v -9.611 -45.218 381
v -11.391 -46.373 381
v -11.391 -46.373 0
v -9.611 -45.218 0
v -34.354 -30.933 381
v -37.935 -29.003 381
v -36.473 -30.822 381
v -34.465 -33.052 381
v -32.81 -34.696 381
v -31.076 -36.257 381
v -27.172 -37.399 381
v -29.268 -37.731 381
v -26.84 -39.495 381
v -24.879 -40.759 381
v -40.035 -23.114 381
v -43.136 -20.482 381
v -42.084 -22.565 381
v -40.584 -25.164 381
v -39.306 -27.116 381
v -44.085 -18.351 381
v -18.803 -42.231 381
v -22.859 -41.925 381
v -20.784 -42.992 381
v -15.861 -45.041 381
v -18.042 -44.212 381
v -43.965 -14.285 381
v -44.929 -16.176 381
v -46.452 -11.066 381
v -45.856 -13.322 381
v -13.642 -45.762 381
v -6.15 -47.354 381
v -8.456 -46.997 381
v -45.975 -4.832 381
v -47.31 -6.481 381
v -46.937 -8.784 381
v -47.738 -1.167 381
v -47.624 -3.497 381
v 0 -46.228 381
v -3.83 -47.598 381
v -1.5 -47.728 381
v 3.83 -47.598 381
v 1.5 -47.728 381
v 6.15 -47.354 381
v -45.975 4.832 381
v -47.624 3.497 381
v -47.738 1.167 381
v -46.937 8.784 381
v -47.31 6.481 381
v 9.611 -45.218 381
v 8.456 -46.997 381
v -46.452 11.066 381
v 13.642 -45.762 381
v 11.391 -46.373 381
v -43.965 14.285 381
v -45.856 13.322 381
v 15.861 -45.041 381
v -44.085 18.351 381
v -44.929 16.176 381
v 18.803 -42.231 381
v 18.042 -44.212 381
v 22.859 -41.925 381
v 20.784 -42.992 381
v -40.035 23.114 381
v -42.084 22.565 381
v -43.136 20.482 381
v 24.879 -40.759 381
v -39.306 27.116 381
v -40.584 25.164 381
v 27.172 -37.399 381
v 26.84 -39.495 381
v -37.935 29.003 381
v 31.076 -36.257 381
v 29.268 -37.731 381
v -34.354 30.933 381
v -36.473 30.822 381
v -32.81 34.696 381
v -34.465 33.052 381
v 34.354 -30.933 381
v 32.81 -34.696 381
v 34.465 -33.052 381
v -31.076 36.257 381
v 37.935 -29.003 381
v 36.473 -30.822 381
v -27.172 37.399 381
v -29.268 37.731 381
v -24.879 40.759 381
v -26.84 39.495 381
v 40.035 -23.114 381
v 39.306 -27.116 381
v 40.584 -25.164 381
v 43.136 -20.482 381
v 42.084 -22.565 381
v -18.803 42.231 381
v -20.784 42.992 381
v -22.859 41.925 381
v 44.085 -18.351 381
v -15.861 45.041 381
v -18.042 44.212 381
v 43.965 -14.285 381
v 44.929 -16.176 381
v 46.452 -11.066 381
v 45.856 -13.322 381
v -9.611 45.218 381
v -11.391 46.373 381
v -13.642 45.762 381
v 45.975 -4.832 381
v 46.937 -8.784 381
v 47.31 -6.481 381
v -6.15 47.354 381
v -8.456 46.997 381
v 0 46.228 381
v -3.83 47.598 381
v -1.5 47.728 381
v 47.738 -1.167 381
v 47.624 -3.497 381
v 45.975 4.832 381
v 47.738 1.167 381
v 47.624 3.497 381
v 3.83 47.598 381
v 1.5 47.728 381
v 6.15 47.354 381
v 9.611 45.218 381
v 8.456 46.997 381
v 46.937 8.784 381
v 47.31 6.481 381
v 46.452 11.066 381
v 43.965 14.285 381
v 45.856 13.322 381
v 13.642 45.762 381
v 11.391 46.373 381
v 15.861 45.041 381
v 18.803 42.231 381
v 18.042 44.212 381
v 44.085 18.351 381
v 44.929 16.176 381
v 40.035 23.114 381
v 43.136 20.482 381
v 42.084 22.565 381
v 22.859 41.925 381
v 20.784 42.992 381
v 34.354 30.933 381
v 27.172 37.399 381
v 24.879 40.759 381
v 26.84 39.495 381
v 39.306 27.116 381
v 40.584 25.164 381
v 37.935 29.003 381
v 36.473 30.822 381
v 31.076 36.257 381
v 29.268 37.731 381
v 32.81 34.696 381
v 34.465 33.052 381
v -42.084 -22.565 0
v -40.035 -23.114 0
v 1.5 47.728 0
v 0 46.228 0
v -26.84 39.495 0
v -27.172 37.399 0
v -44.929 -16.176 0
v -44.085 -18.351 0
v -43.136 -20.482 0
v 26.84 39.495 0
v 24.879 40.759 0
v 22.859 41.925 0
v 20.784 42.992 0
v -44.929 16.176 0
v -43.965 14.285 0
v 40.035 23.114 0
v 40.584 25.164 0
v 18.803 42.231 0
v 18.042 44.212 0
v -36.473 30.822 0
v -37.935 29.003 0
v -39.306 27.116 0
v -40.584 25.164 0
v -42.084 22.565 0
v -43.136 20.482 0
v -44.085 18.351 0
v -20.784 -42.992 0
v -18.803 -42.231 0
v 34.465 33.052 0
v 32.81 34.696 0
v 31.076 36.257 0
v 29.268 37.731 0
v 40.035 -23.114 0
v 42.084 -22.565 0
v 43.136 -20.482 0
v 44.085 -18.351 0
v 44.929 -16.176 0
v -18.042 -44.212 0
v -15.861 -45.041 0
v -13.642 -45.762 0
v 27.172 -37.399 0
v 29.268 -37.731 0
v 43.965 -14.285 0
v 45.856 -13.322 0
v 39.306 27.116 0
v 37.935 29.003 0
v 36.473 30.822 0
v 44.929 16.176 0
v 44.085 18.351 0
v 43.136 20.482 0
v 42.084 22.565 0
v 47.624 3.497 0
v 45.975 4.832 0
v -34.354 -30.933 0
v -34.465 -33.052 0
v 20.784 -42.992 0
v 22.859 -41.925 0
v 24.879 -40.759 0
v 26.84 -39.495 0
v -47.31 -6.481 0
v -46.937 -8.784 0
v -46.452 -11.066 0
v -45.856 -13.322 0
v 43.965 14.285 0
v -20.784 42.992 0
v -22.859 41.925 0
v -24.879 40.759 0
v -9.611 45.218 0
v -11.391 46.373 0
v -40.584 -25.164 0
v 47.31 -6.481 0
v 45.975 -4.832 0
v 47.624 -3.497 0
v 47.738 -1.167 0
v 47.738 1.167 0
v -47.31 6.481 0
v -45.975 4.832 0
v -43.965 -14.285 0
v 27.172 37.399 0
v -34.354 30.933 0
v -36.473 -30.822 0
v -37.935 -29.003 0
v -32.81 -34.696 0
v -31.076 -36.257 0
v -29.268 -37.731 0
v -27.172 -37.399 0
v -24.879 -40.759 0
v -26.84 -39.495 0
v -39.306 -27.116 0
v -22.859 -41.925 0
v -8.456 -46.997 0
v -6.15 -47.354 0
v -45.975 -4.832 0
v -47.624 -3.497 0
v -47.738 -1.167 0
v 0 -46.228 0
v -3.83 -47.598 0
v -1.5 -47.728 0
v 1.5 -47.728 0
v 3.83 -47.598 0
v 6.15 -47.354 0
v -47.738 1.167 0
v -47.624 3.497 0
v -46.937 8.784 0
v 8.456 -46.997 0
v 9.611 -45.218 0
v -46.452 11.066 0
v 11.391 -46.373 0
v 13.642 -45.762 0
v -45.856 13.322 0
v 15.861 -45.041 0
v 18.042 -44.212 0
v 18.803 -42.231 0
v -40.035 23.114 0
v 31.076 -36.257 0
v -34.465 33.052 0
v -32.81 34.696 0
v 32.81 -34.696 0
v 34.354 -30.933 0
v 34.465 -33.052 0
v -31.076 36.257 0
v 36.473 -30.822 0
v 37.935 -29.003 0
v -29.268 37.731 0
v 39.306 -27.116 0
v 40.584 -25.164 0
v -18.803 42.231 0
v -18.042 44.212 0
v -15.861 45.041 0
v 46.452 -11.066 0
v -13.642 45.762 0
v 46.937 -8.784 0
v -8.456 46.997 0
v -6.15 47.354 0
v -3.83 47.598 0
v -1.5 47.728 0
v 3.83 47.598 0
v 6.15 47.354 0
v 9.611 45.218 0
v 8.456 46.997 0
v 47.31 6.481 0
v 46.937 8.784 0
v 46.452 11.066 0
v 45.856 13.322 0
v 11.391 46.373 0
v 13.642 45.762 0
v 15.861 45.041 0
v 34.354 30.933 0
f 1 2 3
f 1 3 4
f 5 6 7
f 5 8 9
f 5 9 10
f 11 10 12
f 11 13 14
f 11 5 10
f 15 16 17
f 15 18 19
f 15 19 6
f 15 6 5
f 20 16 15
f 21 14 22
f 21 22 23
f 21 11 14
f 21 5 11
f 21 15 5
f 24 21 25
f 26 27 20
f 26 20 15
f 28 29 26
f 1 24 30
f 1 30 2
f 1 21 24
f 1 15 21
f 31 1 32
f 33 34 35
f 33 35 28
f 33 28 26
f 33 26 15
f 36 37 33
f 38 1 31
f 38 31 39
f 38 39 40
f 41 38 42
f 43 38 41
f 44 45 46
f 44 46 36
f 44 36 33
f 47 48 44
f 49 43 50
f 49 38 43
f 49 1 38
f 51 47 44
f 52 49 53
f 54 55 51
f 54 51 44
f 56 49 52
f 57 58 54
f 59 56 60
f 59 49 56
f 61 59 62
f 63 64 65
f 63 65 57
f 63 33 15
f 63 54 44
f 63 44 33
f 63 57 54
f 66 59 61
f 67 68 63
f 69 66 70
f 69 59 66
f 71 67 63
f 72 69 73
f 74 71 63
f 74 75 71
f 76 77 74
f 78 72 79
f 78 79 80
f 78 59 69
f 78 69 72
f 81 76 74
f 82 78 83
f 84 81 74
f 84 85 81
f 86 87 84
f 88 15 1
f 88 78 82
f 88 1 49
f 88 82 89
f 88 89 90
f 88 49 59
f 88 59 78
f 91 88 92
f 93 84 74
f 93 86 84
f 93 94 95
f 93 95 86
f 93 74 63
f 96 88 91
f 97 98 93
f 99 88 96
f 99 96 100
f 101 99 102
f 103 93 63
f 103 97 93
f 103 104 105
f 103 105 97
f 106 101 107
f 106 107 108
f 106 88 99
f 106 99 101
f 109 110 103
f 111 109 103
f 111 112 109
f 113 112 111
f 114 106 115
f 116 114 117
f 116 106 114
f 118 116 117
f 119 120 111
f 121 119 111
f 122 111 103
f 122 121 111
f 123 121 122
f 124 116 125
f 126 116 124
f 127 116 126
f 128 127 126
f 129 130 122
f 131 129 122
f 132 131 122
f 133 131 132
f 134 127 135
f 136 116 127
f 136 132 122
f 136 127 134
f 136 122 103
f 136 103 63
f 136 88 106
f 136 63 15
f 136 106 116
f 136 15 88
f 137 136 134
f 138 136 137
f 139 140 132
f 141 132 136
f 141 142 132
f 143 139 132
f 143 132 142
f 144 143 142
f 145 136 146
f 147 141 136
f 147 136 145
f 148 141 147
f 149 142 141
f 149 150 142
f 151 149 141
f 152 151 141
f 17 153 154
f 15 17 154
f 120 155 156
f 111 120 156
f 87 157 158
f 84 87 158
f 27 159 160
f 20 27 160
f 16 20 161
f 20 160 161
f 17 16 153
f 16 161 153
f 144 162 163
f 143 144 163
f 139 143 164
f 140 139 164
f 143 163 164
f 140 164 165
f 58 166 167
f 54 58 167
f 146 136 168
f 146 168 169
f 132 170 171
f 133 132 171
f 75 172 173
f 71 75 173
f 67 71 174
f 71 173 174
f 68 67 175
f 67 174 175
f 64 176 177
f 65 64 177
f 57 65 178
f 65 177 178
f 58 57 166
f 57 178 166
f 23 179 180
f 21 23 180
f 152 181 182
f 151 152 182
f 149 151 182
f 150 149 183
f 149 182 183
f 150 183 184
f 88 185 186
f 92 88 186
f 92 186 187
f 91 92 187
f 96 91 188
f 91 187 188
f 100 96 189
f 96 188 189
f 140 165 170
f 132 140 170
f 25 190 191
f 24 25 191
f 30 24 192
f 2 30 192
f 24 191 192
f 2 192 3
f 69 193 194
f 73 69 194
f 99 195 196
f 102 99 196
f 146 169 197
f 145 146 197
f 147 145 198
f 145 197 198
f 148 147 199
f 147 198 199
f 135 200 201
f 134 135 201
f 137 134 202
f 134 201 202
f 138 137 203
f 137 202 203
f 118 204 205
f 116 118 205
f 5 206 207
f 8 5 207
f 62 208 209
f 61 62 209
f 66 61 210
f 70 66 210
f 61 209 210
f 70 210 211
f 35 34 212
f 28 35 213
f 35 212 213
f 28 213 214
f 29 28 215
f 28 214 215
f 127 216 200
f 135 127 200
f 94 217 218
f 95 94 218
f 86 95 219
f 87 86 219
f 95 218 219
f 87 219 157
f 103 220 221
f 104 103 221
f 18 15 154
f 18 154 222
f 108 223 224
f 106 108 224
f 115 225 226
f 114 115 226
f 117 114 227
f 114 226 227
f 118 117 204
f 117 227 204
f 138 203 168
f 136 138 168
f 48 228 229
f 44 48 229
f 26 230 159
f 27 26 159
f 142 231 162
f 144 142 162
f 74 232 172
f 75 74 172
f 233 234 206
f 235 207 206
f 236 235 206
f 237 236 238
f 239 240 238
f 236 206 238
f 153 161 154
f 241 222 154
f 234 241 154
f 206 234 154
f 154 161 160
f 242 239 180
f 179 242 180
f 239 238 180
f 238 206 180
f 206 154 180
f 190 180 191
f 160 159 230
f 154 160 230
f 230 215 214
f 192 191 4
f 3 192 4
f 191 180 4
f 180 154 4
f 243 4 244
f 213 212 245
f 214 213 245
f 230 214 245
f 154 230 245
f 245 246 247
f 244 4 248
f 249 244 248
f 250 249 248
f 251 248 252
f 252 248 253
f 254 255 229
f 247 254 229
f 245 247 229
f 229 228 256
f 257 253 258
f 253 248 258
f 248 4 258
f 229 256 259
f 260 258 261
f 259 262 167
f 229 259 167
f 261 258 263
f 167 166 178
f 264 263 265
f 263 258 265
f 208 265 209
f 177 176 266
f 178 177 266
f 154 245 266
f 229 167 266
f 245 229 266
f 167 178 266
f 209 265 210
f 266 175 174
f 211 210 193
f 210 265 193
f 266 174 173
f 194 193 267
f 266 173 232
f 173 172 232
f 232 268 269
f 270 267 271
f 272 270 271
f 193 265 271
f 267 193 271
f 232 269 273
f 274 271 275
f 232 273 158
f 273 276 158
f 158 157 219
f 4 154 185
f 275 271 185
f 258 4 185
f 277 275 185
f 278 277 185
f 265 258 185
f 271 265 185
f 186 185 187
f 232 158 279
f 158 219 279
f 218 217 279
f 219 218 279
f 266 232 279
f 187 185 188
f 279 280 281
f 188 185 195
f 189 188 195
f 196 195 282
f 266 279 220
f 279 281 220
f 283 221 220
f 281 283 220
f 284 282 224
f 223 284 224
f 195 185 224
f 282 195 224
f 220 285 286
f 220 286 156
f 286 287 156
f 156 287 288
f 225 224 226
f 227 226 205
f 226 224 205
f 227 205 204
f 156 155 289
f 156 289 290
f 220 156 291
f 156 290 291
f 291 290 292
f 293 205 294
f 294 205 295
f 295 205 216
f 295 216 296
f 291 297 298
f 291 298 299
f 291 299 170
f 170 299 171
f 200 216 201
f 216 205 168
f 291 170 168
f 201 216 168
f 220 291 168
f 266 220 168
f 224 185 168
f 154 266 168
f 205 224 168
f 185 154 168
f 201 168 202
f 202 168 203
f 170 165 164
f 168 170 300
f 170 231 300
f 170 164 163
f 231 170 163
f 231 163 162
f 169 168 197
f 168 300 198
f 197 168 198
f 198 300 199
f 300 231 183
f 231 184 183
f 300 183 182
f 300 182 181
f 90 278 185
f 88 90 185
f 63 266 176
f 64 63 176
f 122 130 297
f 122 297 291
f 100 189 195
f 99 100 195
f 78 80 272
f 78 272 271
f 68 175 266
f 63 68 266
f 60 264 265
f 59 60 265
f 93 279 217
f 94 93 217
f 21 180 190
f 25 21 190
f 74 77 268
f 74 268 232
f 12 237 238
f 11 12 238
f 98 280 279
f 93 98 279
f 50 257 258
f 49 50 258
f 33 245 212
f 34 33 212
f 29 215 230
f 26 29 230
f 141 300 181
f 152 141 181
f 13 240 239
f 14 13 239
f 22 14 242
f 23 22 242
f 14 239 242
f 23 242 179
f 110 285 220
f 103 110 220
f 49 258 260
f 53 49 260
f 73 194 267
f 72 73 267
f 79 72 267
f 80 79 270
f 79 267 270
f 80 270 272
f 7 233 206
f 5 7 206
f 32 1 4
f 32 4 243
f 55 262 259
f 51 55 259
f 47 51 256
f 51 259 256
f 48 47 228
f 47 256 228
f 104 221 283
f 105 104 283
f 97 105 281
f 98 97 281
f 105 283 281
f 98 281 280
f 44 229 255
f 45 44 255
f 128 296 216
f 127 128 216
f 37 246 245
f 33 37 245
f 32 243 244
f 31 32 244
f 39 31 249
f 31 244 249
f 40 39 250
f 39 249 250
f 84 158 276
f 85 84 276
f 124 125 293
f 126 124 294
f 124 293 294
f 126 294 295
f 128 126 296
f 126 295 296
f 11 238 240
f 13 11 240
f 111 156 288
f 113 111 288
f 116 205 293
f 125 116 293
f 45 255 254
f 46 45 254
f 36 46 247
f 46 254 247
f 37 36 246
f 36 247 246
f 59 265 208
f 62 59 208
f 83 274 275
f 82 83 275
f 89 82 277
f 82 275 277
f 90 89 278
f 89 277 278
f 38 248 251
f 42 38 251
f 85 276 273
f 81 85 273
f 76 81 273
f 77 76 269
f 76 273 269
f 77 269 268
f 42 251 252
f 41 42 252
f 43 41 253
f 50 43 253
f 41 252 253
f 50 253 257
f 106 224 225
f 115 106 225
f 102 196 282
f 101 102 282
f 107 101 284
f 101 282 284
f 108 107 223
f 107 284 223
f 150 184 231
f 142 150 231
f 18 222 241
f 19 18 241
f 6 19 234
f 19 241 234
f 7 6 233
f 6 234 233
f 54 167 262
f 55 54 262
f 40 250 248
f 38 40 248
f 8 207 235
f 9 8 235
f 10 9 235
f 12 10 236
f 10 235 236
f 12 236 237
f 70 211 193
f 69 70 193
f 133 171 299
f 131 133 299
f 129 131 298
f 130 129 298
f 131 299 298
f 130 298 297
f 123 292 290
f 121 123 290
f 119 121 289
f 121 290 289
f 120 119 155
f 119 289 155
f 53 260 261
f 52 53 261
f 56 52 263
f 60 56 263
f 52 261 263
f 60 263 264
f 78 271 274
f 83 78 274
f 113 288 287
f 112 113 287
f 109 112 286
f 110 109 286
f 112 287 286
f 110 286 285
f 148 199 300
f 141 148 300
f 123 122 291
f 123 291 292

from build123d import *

# Parameters (mm, degrees)
F1_DEPTH = 381


with BuildPart() as f1:
    # F0 (on Top) → F1 (new body)
    with BuildSketch(Plane.XY):
        with BuildLine():
            Line((0, -46.228), (1.500422, -47.728422))
            ThreePointArc((1.500422, -47.728422), (4.991443, -47.49041), (8.455663, -46.997396))
            Line((8.455663, -46.997396), (9.611342, -45.217807))
            Line((9.611342, -45.217807), (11.390931, -46.373486))
            ThreePointArc((11.390931, -46.373486), (14.75618, -45.414851), (18.042195, -44.212359))
            Line((18.042195, -44.212359), (18.802622, -42.231379))
            Line((18.802622, -42.231379), (20.783601, -42.991806))
            ThreePointArc((20.783601, -42.991806), (23.876, -41.354445), (26.840196, -39.49503))
            Line((26.840196, -39.49503), (27.172137, -37.399238))
            Line((27.172137, -37.399238), (29.267929, -37.731179))
            ThreePointArc((29.267929, -37.731179), (31.952325, -35.486652), (34.465152, -33.051578))
            Line((34.465152, -33.051578), (34.354099, -30.93257))
            Line((34.354099, -30.93257), (36.473108, -30.821517))
            ThreePointArc((36.473108, -30.821517), (38.63218, -28.067921), (40.583815, -25.163614))
            Line((40.583815, -25.163614), (40.034622, -23.114))
            Line((40.034622, -23.114), (42.084237, -22.564808))
            ThreePointArc((42.084237, -22.564808), (43.623623, -19.422488), (44.928771, -16.175879))
            Line((44.928771, -16.175879), (43.965441, -14.285238))
            Line((43.965441, -14.285238), (45.856082, -13.321908))
            ThreePointArc((45.856082, -13.321908), (46.708504, -9.928199), (47.310124, -6.481181))
            Line((47.310124, -6.481181), (45.974758, -4.832142))
            Line((45.974758, -4.832142), (47.623797, -3.496776))
            ThreePointArc((47.623797, -3.496776), (47.752, 0), (47.623797, 3.496776))
            Line((47.623797, 3.496776), (45.974758, 4.832142))
            Line((45.974758, 4.832142), (47.310124, 6.481181))
            ThreePointArc((47.310124, 6.481181), (46.708504, 9.928199), (45.856082, 13.321908))
            Line((45.856082, 13.321908), (43.965441, 14.285238))
            Line((43.965441, 14.285238), (44.928771, 16.175879))
            ThreePointArc((44.928771, 16.175879), (43.623623, 19.422488), (42.084237, 22.564808))
            Line((42.084237, 22.564808), (40.034622, 23.114))
            Line((40.034622, 23.114), (40.583815, 25.163614))
            ThreePointArc((40.583815, 25.163614), (38.63218, 28.067921), (36.473108, 30.821517))
            Line((36.473108, 30.821517), (34.354099, 30.93257))
            Line((34.354099, 30.93257), (34.465152, 33.051578))
            ThreePointArc((34.465152, 33.051578), (31.952325, 35.486652), (29.267929, 37.731179))
            Line((29.267929, 37.731179), (27.172137, 37.399238))
            Line((27.172137, 37.399238), (26.840196, 39.49503))
            ThreePointArc((26.840196, 39.49503), (23.876, 41.354445), (20.783601, 42.991806))
            Line((20.783601, 42.991806), (18.802622, 42.231379))
            Line((18.802622, 42.231379), (18.042195, 44.212359))
            ThreePointArc((18.042195, 44.212359), (14.75618, 45.414851), (11.390931, 46.373486))
            Line((11.390931, 46.373486), (9.611342, 45.217807))
            Line((9.611342, 45.217807), (8.455663, 46.997396))
            ThreePointArc((8.455663, 46.997396), (4.991443, 47.49041), (1.500422, 47.728422))
            Line((1.500422, 47.728422), (0, 46.228))
            Line((0, 46.228), (-1.500422, 47.728422))
            ThreePointArc((-1.500422, 47.728422), (-4.991443, 47.49041), (-8.455663, 46.997396))
            Line((-8.455663, 46.997396), (-9.611342, 45.217807))
            Line((-9.611342, 45.217807), (-11.390931, 46.373486))
            ThreePointArc((-11.390931, 46.373486), (-14.75618, 45.414851), (-18.042195, 44.212359))
            Line((-18.042195, 44.212359), (-18.802622, 42.231379))
            Line((-18.802622, 42.231379), (-20.783601, 42.991806))
            ThreePointArc((-20.783601, 42.991806), (-23.876, 41.354445), (-26.840196, 39.49503))
            Line((-26.840196, 39.49503), (-27.172137, 37.399238))
            Line((-27.172137, 37.399238), (-29.267929, 37.731179))
            ThreePointArc((-29.267929, 37.731179), (-31.952325, 35.486652), (-34.465152, 33.051578))
            Line((-34.465152, 33.051578), (-34.354099, 30.93257))
            Line((-34.354099, 30.93257), (-36.473108, 30.821517))
            ThreePointArc((-36.473108, 30.821517), (-38.63218, 28.067921), (-40.583815, 25.163614))
            Line((-40.583815, 25.163614), (-40.034622, 23.114))
            Line((-40.034622, 23.114), (-42.084237, 22.564808))
            ThreePointArc((-42.084237, 22.564808), (-43.623623, 19.422488), (-44.928771, 16.175879))
            Line((-44.928771, 16.175879), (-43.965441, 14.285238))
            Line((-43.965441, 14.285238), (-45.856082, 13.321908))
            ThreePointArc((-45.856082, 13.321908), (-46.708504, 9.928199), (-47.310124, 6.481181))
            Line((-47.310124, 6.481181), (-45.974758, 4.832142))
            Line((-45.974758, 4.832142), (-47.623797, 3.496776))
            ThreePointArc((-47.623797, 3.496776), (-47.752, 0), (-47.623797, -3.496776))
            Line((-47.623797, -3.496776), (-45.974758, -4.832142))
            Line((-45.974758, -4.832142), (-47.310124, -6.481181))
            ThreePointArc((-47.310124, -6.481181), (-46.708504, -9.928199), (-45.856082, -13.321908))
            Line((-45.856082, -13.321908), (-43.965441, -14.285238))
            Line((-43.965441, -14.285238), (-44.928771, -16.175879))
            ThreePointArc((-44.928771, -16.175879), (-43.623623, -19.422488), (-42.084237, -22.564808))
            Line((-42.084237, -22.564808), (-40.034622, -23.114))
            Line((-40.034622, -23.114), (-40.583815, -25.163614))
            ThreePointArc((-40.583815, -25.163614), (-38.63218, -28.067921), (-36.473108, -30.821517))
            Line((-36.473108, -30.821517), (-34.354099, -30.93257))
            Line((-34.354099, -30.93257), (-34.465152, -33.051578))
            ThreePointArc((-34.465152, -33.051578), (-31.952325, -35.486652), (-29.267929, -37.731179))
            Line((-29.267929, -37.731179), (-27.172137, -37.399238))
            Line((-27.172137, -37.399238), (-26.840196, -39.49503))
            ThreePointArc((-26.840196, -39.49503), (-23.876, -41.354445), (-20.783601, -42.991806))
            Line((-20.783601, -42.991806), (-18.802622, -42.231379))
            Line((-18.802622, -42.231379), (-18.042195, -44.212359))
            ThreePointArc((-18.042195, -44.212359), (-14.75618, -45.414851), (-11.390931, -46.373486))
            Line((-11.390931, -46.373486), (-9.611342, -45.217807))
            Line((-9.611342, -45.217807), (-8.455663, -46.997396))
            ThreePointArc((-8.455663, -46.997396), (-4.991443, -47.49041), (-1.500422, -47.728422))
            Line((-1.500422, -47.728422), (0, -46.228))
        make_face()
    extrude(amount=F1_DEPTH)


solid = f1.part
